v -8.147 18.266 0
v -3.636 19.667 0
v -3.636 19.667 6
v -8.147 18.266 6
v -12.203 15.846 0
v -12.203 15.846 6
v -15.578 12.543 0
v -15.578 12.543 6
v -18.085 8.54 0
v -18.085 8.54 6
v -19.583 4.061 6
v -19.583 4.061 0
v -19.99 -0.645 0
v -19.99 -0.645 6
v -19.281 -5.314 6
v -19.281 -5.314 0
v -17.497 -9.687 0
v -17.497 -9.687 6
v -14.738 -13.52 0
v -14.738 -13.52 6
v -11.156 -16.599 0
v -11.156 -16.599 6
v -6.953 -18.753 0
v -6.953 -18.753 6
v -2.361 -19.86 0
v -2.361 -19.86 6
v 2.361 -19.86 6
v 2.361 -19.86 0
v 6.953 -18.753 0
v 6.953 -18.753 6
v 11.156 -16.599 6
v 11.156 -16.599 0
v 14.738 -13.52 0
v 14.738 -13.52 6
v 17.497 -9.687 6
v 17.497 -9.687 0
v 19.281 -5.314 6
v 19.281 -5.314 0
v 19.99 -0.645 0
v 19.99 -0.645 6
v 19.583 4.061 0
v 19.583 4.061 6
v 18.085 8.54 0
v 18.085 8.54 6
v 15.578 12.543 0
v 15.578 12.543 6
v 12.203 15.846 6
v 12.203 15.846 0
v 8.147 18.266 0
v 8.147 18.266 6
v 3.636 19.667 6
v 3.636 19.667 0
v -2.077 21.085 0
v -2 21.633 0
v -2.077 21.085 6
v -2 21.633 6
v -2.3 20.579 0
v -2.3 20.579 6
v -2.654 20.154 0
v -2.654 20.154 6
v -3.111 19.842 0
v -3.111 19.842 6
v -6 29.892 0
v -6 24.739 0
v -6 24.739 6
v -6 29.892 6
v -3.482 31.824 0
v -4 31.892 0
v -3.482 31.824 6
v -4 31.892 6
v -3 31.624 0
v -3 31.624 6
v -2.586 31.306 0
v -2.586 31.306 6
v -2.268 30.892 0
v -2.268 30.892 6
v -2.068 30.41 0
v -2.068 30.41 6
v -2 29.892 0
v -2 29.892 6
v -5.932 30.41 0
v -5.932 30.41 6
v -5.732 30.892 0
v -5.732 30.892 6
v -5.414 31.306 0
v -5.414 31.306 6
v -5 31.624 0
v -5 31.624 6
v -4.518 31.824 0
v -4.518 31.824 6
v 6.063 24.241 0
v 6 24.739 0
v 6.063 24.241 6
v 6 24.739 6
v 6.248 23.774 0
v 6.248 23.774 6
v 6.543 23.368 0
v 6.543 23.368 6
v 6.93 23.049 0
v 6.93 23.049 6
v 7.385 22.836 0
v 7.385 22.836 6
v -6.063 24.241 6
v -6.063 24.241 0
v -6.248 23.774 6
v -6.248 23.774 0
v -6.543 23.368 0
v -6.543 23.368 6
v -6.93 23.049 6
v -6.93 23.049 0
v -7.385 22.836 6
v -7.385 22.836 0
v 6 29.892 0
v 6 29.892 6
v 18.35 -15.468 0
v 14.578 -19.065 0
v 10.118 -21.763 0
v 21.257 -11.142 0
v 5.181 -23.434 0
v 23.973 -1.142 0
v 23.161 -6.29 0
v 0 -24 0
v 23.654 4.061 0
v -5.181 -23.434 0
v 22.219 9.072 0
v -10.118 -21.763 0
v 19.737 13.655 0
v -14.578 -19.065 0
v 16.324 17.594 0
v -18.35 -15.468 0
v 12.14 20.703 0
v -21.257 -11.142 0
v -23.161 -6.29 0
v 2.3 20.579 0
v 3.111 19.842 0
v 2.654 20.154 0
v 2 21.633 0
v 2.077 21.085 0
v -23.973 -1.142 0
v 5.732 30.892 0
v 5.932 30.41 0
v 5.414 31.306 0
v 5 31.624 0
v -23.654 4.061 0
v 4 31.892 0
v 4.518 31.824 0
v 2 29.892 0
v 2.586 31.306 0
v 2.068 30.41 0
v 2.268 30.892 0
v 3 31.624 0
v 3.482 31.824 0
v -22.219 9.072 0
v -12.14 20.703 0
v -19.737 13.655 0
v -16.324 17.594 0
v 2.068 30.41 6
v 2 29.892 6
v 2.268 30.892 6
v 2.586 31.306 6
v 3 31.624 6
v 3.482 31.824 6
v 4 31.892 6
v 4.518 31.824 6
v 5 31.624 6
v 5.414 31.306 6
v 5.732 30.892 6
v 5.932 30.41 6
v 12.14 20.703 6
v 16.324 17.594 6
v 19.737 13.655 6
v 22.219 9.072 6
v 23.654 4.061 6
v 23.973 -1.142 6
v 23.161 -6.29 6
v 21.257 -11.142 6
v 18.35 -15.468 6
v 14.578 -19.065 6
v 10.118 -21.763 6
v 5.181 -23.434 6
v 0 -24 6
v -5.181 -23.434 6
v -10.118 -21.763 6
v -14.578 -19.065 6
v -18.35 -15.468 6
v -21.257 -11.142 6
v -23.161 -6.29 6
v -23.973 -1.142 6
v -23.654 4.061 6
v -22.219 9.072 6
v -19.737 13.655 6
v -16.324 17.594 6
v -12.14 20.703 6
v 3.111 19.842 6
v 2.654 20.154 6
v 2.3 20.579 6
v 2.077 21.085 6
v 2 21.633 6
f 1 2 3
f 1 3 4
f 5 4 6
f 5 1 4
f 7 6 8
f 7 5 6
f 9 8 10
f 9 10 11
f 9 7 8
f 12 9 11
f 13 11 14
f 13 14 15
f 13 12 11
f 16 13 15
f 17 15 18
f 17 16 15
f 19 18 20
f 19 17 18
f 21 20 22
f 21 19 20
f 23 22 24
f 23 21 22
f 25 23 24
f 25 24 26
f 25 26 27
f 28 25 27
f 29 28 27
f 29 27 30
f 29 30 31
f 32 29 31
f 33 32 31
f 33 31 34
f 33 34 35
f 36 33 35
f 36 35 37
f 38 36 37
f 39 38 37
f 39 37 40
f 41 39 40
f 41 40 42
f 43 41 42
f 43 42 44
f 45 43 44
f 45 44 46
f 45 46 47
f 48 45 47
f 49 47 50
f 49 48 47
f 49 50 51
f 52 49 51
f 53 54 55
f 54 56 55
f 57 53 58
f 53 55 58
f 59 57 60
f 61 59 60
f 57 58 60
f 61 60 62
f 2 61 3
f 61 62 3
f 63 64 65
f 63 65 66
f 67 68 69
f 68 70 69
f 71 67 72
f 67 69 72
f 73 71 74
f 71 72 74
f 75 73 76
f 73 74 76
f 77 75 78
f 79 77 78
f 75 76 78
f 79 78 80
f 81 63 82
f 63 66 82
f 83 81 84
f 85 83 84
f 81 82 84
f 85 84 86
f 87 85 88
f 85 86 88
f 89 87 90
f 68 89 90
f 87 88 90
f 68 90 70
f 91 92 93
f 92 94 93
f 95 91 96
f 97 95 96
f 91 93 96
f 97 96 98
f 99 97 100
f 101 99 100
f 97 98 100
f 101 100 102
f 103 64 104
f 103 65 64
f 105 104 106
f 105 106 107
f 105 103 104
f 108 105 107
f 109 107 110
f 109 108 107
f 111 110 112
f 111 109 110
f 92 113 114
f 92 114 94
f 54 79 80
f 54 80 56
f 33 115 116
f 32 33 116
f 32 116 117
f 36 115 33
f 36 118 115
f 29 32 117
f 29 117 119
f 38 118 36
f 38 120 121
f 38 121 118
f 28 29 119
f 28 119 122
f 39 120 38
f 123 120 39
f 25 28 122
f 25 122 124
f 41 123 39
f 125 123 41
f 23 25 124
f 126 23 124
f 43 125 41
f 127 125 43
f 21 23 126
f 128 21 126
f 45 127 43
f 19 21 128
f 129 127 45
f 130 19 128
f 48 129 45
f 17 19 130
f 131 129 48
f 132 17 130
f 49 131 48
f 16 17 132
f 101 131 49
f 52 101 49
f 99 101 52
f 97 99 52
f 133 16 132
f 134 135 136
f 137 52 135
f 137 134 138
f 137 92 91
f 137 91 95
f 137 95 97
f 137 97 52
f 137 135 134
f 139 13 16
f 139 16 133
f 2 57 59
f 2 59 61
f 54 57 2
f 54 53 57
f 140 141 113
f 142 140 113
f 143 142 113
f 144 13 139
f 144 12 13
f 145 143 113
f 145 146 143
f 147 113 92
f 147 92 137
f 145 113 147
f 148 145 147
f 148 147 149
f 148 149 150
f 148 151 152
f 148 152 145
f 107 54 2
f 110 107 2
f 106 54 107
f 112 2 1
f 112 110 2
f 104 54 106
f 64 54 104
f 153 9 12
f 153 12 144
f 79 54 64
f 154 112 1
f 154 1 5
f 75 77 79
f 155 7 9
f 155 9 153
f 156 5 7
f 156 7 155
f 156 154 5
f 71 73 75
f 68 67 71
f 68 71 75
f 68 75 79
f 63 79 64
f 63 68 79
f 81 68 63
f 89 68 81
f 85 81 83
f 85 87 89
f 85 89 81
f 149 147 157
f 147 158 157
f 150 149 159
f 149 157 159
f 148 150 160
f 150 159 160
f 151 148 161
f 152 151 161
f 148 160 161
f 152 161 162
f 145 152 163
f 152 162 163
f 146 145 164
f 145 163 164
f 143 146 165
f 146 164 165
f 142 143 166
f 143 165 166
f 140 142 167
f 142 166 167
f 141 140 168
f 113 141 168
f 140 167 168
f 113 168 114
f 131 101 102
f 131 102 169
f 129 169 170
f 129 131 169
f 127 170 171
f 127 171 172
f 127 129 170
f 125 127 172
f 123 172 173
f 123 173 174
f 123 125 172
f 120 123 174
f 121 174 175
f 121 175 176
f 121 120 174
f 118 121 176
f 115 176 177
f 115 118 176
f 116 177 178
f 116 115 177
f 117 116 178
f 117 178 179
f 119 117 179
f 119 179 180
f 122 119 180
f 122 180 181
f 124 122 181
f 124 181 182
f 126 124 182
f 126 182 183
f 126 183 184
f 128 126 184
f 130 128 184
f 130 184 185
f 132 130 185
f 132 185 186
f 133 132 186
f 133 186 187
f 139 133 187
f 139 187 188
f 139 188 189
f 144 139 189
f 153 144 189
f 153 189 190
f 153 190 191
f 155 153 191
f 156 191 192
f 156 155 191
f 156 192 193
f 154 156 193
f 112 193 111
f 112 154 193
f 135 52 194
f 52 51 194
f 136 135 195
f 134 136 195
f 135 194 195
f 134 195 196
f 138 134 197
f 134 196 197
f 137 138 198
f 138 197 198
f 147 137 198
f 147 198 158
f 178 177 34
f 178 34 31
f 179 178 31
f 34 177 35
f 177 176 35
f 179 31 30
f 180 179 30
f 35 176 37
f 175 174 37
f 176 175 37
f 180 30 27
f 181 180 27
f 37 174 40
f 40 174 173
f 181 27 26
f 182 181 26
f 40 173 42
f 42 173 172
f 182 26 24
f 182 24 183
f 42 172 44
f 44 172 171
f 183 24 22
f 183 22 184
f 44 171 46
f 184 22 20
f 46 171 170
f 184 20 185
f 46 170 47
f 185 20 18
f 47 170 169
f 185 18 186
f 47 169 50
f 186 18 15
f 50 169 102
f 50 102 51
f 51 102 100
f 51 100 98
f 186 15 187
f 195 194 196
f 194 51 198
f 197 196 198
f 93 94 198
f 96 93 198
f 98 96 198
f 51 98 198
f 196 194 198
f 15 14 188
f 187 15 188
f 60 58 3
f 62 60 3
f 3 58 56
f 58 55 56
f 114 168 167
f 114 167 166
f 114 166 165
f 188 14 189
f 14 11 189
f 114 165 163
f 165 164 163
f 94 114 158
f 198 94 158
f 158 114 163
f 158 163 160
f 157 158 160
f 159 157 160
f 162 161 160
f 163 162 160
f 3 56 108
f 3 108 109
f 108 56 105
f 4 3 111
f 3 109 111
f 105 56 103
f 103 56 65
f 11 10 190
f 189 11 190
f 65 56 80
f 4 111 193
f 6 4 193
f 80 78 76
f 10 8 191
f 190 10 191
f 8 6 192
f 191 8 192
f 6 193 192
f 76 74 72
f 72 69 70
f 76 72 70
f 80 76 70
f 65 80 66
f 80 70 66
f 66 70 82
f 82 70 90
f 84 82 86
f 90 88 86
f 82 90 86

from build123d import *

# Parameters (mm, degrees)
BOSS_EXTRUDE1_DEPTH = 6
FILLET1_R           = 2


with BuildPart() as part:
    # Sketch1 → Boss-Extrude1 (new body)
    with BuildSketch(Plane.XY):
        with BuildLine():
            Line((-6, 23.237900077), (-6, 31.891873593))
            Line((-6, 31.891873593), (-2, 31.891873593))
            Line((-2, 31.891873593), (-2, 19.899748742))
            ThreePointArc((-2, 19.899748742), (0, -20), (2, 19.899748742))
            Line((2, 19.899748742), (2, 31.891873593))
            Line((2, 31.891873593), (6, 31.891873593))
            Line((6, 31.891873593), (6, 23.237900077))
            ThreePointArc((6, 23.237900077), (0, -24), (-6, 23.237900077))
        make_face()
    extrude(amount=BOSS_EXTRUDE1_DEPTH)

    # Fillet1
    fillet1_edges = [part.edges().sort_by_distance(p)[0] for p in [
        (-2, 19.899748742, 3),
        (2, 19.899748742, 3),
        (6, 23.237900077, 3),
        (-6, 23.237900077, 3),
        (6, 31.891873593, 3),
        (2, 31.891873593, 3),
        (-2, 31.891873593, 3),
        (-6, 31.891873593, 3),
    ]]
    fillet(fillet1_edges, radius=FILLET1_R - 0.0001)  # a hair under: the kernel refuses the full size


solid = part.part
